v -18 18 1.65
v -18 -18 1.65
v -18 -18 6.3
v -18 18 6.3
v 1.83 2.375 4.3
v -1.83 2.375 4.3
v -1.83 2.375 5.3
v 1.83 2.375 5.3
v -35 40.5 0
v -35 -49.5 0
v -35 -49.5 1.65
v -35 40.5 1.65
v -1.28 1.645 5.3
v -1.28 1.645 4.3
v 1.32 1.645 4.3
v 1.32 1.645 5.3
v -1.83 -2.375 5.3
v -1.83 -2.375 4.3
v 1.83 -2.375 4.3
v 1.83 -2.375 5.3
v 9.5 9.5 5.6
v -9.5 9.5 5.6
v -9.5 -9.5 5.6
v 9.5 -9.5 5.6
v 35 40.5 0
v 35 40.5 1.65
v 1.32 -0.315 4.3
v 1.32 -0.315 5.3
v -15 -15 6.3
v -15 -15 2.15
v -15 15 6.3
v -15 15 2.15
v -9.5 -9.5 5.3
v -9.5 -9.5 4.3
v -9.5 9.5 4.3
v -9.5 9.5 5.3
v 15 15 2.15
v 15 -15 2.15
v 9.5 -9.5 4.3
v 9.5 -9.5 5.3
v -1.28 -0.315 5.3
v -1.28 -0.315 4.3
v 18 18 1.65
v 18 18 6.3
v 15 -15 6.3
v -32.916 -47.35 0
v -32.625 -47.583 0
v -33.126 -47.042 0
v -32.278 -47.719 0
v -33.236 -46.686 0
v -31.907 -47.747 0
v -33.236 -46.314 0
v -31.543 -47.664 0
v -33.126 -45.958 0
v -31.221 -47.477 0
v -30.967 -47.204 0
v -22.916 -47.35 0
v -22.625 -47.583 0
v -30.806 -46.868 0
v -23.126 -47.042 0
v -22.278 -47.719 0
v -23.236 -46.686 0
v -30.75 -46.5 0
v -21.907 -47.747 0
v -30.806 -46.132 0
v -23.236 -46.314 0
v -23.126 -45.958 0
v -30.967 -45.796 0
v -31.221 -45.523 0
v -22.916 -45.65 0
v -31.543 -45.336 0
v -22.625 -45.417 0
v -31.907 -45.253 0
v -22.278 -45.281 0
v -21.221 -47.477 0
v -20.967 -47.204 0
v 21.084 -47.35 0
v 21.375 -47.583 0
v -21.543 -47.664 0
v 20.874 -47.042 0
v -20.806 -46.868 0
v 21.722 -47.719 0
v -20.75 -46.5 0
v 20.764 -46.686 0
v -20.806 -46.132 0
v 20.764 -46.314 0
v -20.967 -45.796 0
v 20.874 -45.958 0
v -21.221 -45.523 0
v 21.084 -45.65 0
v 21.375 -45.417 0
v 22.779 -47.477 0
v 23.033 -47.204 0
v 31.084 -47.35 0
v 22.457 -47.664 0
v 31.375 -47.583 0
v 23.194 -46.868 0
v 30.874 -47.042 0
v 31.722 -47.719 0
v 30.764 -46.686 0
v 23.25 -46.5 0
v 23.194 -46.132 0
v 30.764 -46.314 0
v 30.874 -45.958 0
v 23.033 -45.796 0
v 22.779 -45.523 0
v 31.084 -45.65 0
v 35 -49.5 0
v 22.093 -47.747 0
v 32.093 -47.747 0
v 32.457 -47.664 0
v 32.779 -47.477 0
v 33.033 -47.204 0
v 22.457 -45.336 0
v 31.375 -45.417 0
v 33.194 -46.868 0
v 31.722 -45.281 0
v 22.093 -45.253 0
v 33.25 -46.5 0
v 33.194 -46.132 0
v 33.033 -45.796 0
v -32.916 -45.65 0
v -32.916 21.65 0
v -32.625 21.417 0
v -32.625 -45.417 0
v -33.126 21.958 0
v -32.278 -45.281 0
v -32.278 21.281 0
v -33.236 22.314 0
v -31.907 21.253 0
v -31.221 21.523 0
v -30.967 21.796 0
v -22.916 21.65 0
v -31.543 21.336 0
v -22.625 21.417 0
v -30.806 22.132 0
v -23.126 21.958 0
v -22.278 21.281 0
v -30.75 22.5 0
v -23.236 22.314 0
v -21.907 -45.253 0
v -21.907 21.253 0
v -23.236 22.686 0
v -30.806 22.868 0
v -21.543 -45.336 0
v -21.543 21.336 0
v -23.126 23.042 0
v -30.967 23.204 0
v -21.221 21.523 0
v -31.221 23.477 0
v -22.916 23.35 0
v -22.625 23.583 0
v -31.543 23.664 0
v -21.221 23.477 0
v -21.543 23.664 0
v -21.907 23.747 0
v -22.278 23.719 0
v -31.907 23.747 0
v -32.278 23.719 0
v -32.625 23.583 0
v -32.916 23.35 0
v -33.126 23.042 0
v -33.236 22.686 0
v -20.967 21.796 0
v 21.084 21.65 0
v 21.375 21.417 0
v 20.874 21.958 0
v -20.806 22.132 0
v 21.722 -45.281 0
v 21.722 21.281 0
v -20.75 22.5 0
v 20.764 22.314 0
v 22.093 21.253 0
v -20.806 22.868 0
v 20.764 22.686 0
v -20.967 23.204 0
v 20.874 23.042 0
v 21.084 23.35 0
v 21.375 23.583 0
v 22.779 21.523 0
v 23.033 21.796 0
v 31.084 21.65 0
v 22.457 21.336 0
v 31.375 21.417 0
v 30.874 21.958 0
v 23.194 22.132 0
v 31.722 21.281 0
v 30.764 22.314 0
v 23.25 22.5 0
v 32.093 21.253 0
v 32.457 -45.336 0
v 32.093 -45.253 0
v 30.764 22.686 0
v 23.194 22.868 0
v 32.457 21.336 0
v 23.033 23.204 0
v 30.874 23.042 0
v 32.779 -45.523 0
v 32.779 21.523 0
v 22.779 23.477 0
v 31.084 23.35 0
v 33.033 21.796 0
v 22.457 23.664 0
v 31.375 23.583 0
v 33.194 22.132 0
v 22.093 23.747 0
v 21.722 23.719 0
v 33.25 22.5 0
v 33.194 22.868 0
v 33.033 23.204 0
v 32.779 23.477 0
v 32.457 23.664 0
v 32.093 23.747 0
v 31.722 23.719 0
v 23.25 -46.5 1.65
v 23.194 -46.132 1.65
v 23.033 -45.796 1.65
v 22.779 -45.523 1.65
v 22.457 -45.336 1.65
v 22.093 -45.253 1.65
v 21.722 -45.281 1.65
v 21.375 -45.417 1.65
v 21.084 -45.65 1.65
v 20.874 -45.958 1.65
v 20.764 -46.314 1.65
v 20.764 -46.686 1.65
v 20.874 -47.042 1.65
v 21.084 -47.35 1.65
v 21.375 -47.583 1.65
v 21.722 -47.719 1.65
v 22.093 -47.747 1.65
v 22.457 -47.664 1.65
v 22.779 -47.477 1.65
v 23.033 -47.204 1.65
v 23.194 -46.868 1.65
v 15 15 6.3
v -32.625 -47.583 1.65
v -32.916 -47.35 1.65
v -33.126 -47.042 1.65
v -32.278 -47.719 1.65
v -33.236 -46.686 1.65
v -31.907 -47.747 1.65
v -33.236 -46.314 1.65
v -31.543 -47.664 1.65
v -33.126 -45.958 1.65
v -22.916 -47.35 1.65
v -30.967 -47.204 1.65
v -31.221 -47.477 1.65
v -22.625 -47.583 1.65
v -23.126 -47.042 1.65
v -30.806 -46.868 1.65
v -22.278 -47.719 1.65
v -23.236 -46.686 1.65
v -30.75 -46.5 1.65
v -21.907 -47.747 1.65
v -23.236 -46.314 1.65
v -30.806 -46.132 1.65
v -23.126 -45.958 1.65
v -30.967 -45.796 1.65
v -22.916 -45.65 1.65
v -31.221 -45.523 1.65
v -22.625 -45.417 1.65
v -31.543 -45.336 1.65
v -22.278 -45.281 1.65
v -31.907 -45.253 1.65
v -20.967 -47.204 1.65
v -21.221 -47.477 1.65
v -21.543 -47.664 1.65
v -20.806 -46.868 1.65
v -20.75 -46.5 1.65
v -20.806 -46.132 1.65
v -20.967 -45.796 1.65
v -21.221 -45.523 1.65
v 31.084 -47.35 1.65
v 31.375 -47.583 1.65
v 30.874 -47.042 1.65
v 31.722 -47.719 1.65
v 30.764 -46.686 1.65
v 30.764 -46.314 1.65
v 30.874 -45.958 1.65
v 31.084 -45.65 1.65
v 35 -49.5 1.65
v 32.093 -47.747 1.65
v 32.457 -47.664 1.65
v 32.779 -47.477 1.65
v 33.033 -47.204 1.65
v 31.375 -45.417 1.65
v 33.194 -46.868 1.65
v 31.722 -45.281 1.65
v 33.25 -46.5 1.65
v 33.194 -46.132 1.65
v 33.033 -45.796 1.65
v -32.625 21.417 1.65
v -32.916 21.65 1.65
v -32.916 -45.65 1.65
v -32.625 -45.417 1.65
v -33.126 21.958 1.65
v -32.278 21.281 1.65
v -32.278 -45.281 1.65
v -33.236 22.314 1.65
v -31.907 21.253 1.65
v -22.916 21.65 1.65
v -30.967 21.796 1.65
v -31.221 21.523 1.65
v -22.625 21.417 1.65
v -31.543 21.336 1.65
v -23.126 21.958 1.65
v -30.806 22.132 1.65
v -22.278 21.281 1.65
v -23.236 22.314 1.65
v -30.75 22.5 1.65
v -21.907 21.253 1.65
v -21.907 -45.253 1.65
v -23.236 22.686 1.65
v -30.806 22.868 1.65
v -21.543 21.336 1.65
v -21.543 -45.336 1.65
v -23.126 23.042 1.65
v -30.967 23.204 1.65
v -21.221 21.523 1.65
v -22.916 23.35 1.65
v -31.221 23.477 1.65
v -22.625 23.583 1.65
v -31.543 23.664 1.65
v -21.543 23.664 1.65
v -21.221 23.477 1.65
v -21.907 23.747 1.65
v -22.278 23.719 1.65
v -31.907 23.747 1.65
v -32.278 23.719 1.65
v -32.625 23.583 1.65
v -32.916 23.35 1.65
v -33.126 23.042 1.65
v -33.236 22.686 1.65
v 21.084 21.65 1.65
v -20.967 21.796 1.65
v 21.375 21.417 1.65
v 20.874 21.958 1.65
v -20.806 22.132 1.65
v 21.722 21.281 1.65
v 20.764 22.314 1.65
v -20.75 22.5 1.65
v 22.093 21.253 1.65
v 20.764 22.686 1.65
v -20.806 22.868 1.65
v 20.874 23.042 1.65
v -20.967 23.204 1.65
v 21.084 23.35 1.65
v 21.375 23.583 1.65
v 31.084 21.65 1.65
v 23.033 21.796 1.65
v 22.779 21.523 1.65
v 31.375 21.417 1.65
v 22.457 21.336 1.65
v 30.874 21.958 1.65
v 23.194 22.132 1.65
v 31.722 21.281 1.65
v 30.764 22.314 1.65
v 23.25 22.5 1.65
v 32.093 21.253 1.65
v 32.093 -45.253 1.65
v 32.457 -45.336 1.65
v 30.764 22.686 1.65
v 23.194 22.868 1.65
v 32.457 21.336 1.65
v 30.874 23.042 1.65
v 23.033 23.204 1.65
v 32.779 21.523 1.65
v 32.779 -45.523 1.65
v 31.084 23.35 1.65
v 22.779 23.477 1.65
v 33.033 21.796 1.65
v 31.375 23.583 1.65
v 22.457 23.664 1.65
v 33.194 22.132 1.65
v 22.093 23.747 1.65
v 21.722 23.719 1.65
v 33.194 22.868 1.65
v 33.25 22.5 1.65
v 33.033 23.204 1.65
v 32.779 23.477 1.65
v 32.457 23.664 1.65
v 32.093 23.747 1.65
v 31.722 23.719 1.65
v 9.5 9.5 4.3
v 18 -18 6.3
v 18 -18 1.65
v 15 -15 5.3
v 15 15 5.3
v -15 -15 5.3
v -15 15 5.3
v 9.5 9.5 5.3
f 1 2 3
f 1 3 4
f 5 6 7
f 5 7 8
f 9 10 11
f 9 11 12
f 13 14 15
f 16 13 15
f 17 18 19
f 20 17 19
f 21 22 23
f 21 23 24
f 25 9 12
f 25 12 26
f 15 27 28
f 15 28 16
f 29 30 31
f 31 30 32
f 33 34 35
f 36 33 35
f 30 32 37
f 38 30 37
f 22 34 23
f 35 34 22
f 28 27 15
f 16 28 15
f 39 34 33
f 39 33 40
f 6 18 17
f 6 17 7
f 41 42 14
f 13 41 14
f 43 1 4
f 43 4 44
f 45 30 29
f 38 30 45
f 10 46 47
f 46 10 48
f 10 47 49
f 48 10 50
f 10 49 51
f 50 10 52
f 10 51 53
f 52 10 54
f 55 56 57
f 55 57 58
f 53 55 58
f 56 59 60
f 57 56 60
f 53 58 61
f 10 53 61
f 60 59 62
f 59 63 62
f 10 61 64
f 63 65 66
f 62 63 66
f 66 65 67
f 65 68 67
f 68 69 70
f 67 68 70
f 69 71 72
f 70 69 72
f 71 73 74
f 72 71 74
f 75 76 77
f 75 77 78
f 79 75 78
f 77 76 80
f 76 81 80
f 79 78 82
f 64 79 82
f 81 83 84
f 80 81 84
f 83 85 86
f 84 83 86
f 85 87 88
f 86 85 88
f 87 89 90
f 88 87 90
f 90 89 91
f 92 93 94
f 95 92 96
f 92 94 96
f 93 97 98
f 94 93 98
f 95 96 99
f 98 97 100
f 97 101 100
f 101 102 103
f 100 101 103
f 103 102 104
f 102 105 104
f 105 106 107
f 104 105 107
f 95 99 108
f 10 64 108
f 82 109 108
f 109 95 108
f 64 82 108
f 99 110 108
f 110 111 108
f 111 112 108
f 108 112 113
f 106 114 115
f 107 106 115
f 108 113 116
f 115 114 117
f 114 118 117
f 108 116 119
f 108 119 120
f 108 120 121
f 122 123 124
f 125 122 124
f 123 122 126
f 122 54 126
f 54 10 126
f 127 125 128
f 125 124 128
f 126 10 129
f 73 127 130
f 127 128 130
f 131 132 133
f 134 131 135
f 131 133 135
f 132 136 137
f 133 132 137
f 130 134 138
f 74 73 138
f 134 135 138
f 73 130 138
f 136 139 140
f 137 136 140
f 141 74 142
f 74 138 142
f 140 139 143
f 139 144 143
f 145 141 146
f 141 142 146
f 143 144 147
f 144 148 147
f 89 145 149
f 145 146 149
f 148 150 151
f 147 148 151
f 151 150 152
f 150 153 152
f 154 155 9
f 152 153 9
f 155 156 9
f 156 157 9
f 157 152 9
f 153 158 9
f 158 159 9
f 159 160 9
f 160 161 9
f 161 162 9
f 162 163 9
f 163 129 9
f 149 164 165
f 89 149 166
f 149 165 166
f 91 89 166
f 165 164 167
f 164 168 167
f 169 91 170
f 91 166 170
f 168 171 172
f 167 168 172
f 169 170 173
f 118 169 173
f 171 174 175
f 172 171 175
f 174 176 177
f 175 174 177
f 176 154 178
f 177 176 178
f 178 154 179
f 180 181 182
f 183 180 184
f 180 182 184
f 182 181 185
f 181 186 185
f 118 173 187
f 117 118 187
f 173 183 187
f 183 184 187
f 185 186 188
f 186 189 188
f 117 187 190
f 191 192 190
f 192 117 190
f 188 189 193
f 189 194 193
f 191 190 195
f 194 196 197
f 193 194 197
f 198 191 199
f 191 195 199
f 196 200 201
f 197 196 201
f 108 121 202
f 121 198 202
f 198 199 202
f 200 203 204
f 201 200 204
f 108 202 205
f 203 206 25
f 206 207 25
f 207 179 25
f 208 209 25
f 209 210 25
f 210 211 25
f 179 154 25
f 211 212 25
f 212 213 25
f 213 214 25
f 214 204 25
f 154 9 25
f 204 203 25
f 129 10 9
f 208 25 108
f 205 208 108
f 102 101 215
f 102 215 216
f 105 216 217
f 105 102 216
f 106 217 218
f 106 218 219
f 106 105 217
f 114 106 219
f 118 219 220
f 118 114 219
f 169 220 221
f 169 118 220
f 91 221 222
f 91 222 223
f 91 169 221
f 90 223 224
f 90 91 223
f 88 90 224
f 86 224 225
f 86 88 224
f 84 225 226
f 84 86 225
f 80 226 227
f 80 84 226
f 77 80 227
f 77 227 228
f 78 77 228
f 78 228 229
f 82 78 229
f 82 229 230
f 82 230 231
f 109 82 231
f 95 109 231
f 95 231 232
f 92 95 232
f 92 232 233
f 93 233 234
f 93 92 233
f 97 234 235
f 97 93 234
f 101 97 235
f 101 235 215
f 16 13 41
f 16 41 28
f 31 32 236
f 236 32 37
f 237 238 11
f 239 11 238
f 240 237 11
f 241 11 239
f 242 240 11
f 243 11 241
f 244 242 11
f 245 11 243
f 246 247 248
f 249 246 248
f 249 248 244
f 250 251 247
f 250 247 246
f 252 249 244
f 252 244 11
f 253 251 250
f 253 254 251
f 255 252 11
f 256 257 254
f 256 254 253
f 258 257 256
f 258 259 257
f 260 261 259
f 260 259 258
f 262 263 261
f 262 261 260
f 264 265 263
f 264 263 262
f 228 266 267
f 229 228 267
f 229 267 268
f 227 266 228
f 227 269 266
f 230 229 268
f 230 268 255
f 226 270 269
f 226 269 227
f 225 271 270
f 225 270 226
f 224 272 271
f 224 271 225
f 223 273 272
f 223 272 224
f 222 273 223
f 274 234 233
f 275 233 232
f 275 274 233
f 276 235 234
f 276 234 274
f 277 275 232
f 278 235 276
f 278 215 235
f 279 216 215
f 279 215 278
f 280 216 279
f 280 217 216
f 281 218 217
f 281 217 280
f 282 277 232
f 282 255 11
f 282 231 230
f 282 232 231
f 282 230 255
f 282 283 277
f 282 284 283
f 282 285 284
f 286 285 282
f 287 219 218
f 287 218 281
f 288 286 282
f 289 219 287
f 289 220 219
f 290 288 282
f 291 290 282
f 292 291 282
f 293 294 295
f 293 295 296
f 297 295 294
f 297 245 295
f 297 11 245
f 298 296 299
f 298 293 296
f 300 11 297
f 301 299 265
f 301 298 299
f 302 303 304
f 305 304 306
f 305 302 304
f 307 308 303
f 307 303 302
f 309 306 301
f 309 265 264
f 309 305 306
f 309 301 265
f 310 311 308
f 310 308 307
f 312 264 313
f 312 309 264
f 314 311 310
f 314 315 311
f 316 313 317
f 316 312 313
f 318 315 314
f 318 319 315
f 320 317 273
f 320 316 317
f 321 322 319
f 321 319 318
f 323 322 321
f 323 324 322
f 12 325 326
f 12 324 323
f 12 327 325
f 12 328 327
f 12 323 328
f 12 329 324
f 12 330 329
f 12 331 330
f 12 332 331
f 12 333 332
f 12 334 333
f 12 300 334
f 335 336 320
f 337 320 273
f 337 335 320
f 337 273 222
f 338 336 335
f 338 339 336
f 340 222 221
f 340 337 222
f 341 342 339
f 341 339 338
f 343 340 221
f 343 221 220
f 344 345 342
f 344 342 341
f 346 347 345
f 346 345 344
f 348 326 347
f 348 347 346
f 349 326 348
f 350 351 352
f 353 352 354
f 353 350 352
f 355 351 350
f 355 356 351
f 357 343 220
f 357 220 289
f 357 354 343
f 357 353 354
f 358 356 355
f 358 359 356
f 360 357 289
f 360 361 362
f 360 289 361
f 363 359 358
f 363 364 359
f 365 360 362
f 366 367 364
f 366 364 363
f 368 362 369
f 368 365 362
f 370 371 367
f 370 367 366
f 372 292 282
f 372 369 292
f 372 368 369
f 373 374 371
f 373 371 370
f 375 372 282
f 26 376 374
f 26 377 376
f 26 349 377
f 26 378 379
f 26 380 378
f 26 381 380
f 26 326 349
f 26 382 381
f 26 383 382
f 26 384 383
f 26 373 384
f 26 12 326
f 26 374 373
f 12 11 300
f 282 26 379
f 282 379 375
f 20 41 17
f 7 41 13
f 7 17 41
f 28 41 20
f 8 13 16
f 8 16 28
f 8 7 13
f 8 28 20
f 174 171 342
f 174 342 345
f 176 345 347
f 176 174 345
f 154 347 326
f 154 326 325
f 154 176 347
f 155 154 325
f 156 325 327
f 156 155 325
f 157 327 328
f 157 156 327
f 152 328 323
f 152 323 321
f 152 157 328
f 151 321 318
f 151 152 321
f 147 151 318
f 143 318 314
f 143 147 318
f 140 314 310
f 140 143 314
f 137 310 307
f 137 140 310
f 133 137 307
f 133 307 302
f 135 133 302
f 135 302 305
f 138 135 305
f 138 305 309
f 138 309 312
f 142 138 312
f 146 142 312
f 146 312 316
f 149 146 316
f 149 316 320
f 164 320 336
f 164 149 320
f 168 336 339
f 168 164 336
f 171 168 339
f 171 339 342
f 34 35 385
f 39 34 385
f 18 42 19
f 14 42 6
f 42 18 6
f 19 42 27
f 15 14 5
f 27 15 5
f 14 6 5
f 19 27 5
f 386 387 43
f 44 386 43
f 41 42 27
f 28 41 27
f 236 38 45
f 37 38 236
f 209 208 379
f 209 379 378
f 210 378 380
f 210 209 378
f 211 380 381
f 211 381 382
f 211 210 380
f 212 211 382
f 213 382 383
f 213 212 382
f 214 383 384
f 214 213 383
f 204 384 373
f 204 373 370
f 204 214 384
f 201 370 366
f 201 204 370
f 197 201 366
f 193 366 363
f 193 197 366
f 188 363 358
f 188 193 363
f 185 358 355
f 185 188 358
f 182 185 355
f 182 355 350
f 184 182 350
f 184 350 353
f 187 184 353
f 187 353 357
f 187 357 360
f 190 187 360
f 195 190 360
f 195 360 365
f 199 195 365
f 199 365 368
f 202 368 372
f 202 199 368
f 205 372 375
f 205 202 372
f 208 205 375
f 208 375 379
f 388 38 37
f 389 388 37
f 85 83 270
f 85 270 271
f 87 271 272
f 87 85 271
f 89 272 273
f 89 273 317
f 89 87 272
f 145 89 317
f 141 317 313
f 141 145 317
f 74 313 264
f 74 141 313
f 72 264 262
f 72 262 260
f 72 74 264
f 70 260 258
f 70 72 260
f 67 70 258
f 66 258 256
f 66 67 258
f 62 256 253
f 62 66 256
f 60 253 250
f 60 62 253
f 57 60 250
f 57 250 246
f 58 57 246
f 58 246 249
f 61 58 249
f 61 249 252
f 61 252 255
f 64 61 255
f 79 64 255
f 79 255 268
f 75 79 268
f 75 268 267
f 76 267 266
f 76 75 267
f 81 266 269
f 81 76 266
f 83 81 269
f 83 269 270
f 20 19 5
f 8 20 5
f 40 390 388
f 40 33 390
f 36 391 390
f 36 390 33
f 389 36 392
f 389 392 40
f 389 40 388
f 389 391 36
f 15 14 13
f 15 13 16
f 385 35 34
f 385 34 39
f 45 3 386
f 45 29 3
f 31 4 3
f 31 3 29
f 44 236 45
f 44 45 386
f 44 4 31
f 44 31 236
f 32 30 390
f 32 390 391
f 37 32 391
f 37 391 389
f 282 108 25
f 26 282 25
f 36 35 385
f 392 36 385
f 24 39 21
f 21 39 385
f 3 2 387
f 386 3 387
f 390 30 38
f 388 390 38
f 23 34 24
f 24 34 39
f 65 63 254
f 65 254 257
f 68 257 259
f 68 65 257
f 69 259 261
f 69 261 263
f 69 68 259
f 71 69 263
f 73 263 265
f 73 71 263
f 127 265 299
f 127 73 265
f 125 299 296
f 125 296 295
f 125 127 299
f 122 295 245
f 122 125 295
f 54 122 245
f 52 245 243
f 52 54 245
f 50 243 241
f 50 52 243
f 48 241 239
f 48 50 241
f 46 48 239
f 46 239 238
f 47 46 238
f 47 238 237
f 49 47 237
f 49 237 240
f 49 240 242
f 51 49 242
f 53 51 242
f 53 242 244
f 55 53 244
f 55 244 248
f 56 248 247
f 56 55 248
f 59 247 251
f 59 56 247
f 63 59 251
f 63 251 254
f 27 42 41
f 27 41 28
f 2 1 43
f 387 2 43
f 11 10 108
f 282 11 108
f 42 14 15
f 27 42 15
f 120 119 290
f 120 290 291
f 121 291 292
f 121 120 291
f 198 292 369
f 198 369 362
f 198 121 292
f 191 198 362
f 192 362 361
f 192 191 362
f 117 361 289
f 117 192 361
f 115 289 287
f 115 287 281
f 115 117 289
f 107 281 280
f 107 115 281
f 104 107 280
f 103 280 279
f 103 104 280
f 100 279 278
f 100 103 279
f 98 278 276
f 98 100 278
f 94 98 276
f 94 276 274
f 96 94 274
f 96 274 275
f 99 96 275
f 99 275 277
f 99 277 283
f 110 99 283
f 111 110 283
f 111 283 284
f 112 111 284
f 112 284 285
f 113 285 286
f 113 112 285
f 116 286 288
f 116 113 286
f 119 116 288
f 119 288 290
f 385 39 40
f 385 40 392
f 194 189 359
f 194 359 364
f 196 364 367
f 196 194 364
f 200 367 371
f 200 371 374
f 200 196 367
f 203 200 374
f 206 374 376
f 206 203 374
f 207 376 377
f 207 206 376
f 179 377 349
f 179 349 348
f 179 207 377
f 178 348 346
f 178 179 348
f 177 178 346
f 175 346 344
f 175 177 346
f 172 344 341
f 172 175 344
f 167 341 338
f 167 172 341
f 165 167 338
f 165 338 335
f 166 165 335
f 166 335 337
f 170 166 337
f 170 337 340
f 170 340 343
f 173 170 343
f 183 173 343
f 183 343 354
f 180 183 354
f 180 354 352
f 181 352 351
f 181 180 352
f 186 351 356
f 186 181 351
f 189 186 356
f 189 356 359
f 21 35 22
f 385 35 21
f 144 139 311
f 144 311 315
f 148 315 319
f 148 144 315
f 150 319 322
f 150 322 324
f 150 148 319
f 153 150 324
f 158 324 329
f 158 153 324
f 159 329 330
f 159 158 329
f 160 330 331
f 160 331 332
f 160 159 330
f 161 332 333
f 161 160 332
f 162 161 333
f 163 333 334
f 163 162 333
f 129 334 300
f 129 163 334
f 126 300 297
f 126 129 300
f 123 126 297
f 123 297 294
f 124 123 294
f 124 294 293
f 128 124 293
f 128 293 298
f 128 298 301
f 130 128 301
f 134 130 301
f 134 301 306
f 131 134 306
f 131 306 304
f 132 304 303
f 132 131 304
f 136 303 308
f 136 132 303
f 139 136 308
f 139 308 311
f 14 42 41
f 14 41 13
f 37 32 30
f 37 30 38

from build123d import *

# Parameters (mm, degrees)
F1_W      = 70
F1_H      = 90
F1_R      = 1.25
F2_DEPTH  = 1.65
F3_W      = 36
F3_H      = 36
F3_W_2    = 30
F3_H_2    = 30
F4_DEPTH  = 4.65
F5_DEPTH  = 0.5
F6_W      = 30
F6_H      = 30
F6_W_2    = 19
F6_H_2    = 19
F7_DEPTH  = 3.15
F8_DEPTH  = 2.15
F9_W      = 3.66
F9_H      = 4.75
F9_W_2    = 2.6
F9_H_2    = 1.96
F10_DEPTH = 1
F11_DEPTH = 1
F12_W     = 19
F12_H     = 19
F13_DEPTH = 1.3


with BuildPart() as f2:
    # F1 (on Top) → F2 (new body)
    with BuildSketch(Plane.XY):
        with Locations((0, -4.5)):
            Rectangle(F1_W, F1_H)
        with Locations((-32, -46.5)):
            Circle(F1_R, mode=Mode.SUBTRACT)
        with Locations((-22, -46.5)):
            Circle(F1_R, mode=Mode.SUBTRACT)
        with Locations((22, -46.5)):
            Circle(F1_R, mode=Mode.SUBTRACT)
        with Locations((32, -46.5)):
            Circle(F1_R, mode=Mode.SUBTRACT)
        with Locations((-32, 22.5)):
            Circle(F1_R, mode=Mode.SUBTRACT)
        with Locations((-22, 22.5)):
            Circle(F1_R, mode=Mode.SUBTRACT)
        with Locations((22, 22.5)):
            Circle(F1_R, mode=Mode.SUBTRACT)
        with Locations((32, 22.5)):
            Circle(F1_R, mode=Mode.SUBTRACT)
    extrude(amount=F2_DEPTH)


with BuildPart() as f4:
    # F3 (on face) → F4 (new body)
    with BuildSketch(Plane.XY.offset(1.65)):
        Rectangle(F3_W, F3_H)
        Rectangle(F3_W_2, F3_H_2, mode=Mode.SUBTRACT)
    extrude(amount=F4_DEPTH)

    # F3 (on face) → F5 (join)
    with BuildSketch(Plane.XY.offset(1.65)):
        Rectangle(F3_W_2, F3_H_2)
    extrude(amount=F5_DEPTH)


with BuildPart() as f7:
    # F6 (on face) → F7 (new body)
    with BuildSketch(Plane.XY.offset(2.15)):
        Rectangle(F6_W, F6_H)
        Rectangle(F6_W_2, F6_H_2, mode=Mode.SUBTRACT)
    extrude(amount=F7_DEPTH)

    # F6 (on face) → F8 (join)
    with BuildSketch(Plane.XY.offset(2.15)):
        Rectangle(F6_W_2, F6_H_2)
    extrude(amount=F8_DEPTH)


with BuildPart() as f10:
    # F9 (on face) → F10 (new body)
    with BuildSketch(Plane.XY.offset(4.3)):
        with Locations((1.5065e-05, 1.53106e-05)):
            Rectangle(F9_W, F9_H)
        with Locations((0.020015065, 0.6650153106)):
            Rectangle(F9_W_2, F9_H_2, mode=Mode.SUBTRACT)
    extrude(amount=F10_DEPTH)


with BuildPart() as f11:
    # F9 (on face) → F11 (new body)
    with BuildSketch(Plane.XY.offset(4.3)):
        with Locations((0.020015065, 0.6650153106)):
            Rectangle(F9_W_2, F9_H_2)
    extrude(amount=F11_DEPTH)


with BuildPart() as f13:
    # F12 (on face) → F13 (new body)
    with BuildSketch(Plane.XY.offset(4.3)):
        Rectangle(F12_W, F12_H)
    extrude(amount=F13_DEPTH)


solid = Compound([f2.part, f4.part, f7.part, f10.part, f11.part, f13.part])
